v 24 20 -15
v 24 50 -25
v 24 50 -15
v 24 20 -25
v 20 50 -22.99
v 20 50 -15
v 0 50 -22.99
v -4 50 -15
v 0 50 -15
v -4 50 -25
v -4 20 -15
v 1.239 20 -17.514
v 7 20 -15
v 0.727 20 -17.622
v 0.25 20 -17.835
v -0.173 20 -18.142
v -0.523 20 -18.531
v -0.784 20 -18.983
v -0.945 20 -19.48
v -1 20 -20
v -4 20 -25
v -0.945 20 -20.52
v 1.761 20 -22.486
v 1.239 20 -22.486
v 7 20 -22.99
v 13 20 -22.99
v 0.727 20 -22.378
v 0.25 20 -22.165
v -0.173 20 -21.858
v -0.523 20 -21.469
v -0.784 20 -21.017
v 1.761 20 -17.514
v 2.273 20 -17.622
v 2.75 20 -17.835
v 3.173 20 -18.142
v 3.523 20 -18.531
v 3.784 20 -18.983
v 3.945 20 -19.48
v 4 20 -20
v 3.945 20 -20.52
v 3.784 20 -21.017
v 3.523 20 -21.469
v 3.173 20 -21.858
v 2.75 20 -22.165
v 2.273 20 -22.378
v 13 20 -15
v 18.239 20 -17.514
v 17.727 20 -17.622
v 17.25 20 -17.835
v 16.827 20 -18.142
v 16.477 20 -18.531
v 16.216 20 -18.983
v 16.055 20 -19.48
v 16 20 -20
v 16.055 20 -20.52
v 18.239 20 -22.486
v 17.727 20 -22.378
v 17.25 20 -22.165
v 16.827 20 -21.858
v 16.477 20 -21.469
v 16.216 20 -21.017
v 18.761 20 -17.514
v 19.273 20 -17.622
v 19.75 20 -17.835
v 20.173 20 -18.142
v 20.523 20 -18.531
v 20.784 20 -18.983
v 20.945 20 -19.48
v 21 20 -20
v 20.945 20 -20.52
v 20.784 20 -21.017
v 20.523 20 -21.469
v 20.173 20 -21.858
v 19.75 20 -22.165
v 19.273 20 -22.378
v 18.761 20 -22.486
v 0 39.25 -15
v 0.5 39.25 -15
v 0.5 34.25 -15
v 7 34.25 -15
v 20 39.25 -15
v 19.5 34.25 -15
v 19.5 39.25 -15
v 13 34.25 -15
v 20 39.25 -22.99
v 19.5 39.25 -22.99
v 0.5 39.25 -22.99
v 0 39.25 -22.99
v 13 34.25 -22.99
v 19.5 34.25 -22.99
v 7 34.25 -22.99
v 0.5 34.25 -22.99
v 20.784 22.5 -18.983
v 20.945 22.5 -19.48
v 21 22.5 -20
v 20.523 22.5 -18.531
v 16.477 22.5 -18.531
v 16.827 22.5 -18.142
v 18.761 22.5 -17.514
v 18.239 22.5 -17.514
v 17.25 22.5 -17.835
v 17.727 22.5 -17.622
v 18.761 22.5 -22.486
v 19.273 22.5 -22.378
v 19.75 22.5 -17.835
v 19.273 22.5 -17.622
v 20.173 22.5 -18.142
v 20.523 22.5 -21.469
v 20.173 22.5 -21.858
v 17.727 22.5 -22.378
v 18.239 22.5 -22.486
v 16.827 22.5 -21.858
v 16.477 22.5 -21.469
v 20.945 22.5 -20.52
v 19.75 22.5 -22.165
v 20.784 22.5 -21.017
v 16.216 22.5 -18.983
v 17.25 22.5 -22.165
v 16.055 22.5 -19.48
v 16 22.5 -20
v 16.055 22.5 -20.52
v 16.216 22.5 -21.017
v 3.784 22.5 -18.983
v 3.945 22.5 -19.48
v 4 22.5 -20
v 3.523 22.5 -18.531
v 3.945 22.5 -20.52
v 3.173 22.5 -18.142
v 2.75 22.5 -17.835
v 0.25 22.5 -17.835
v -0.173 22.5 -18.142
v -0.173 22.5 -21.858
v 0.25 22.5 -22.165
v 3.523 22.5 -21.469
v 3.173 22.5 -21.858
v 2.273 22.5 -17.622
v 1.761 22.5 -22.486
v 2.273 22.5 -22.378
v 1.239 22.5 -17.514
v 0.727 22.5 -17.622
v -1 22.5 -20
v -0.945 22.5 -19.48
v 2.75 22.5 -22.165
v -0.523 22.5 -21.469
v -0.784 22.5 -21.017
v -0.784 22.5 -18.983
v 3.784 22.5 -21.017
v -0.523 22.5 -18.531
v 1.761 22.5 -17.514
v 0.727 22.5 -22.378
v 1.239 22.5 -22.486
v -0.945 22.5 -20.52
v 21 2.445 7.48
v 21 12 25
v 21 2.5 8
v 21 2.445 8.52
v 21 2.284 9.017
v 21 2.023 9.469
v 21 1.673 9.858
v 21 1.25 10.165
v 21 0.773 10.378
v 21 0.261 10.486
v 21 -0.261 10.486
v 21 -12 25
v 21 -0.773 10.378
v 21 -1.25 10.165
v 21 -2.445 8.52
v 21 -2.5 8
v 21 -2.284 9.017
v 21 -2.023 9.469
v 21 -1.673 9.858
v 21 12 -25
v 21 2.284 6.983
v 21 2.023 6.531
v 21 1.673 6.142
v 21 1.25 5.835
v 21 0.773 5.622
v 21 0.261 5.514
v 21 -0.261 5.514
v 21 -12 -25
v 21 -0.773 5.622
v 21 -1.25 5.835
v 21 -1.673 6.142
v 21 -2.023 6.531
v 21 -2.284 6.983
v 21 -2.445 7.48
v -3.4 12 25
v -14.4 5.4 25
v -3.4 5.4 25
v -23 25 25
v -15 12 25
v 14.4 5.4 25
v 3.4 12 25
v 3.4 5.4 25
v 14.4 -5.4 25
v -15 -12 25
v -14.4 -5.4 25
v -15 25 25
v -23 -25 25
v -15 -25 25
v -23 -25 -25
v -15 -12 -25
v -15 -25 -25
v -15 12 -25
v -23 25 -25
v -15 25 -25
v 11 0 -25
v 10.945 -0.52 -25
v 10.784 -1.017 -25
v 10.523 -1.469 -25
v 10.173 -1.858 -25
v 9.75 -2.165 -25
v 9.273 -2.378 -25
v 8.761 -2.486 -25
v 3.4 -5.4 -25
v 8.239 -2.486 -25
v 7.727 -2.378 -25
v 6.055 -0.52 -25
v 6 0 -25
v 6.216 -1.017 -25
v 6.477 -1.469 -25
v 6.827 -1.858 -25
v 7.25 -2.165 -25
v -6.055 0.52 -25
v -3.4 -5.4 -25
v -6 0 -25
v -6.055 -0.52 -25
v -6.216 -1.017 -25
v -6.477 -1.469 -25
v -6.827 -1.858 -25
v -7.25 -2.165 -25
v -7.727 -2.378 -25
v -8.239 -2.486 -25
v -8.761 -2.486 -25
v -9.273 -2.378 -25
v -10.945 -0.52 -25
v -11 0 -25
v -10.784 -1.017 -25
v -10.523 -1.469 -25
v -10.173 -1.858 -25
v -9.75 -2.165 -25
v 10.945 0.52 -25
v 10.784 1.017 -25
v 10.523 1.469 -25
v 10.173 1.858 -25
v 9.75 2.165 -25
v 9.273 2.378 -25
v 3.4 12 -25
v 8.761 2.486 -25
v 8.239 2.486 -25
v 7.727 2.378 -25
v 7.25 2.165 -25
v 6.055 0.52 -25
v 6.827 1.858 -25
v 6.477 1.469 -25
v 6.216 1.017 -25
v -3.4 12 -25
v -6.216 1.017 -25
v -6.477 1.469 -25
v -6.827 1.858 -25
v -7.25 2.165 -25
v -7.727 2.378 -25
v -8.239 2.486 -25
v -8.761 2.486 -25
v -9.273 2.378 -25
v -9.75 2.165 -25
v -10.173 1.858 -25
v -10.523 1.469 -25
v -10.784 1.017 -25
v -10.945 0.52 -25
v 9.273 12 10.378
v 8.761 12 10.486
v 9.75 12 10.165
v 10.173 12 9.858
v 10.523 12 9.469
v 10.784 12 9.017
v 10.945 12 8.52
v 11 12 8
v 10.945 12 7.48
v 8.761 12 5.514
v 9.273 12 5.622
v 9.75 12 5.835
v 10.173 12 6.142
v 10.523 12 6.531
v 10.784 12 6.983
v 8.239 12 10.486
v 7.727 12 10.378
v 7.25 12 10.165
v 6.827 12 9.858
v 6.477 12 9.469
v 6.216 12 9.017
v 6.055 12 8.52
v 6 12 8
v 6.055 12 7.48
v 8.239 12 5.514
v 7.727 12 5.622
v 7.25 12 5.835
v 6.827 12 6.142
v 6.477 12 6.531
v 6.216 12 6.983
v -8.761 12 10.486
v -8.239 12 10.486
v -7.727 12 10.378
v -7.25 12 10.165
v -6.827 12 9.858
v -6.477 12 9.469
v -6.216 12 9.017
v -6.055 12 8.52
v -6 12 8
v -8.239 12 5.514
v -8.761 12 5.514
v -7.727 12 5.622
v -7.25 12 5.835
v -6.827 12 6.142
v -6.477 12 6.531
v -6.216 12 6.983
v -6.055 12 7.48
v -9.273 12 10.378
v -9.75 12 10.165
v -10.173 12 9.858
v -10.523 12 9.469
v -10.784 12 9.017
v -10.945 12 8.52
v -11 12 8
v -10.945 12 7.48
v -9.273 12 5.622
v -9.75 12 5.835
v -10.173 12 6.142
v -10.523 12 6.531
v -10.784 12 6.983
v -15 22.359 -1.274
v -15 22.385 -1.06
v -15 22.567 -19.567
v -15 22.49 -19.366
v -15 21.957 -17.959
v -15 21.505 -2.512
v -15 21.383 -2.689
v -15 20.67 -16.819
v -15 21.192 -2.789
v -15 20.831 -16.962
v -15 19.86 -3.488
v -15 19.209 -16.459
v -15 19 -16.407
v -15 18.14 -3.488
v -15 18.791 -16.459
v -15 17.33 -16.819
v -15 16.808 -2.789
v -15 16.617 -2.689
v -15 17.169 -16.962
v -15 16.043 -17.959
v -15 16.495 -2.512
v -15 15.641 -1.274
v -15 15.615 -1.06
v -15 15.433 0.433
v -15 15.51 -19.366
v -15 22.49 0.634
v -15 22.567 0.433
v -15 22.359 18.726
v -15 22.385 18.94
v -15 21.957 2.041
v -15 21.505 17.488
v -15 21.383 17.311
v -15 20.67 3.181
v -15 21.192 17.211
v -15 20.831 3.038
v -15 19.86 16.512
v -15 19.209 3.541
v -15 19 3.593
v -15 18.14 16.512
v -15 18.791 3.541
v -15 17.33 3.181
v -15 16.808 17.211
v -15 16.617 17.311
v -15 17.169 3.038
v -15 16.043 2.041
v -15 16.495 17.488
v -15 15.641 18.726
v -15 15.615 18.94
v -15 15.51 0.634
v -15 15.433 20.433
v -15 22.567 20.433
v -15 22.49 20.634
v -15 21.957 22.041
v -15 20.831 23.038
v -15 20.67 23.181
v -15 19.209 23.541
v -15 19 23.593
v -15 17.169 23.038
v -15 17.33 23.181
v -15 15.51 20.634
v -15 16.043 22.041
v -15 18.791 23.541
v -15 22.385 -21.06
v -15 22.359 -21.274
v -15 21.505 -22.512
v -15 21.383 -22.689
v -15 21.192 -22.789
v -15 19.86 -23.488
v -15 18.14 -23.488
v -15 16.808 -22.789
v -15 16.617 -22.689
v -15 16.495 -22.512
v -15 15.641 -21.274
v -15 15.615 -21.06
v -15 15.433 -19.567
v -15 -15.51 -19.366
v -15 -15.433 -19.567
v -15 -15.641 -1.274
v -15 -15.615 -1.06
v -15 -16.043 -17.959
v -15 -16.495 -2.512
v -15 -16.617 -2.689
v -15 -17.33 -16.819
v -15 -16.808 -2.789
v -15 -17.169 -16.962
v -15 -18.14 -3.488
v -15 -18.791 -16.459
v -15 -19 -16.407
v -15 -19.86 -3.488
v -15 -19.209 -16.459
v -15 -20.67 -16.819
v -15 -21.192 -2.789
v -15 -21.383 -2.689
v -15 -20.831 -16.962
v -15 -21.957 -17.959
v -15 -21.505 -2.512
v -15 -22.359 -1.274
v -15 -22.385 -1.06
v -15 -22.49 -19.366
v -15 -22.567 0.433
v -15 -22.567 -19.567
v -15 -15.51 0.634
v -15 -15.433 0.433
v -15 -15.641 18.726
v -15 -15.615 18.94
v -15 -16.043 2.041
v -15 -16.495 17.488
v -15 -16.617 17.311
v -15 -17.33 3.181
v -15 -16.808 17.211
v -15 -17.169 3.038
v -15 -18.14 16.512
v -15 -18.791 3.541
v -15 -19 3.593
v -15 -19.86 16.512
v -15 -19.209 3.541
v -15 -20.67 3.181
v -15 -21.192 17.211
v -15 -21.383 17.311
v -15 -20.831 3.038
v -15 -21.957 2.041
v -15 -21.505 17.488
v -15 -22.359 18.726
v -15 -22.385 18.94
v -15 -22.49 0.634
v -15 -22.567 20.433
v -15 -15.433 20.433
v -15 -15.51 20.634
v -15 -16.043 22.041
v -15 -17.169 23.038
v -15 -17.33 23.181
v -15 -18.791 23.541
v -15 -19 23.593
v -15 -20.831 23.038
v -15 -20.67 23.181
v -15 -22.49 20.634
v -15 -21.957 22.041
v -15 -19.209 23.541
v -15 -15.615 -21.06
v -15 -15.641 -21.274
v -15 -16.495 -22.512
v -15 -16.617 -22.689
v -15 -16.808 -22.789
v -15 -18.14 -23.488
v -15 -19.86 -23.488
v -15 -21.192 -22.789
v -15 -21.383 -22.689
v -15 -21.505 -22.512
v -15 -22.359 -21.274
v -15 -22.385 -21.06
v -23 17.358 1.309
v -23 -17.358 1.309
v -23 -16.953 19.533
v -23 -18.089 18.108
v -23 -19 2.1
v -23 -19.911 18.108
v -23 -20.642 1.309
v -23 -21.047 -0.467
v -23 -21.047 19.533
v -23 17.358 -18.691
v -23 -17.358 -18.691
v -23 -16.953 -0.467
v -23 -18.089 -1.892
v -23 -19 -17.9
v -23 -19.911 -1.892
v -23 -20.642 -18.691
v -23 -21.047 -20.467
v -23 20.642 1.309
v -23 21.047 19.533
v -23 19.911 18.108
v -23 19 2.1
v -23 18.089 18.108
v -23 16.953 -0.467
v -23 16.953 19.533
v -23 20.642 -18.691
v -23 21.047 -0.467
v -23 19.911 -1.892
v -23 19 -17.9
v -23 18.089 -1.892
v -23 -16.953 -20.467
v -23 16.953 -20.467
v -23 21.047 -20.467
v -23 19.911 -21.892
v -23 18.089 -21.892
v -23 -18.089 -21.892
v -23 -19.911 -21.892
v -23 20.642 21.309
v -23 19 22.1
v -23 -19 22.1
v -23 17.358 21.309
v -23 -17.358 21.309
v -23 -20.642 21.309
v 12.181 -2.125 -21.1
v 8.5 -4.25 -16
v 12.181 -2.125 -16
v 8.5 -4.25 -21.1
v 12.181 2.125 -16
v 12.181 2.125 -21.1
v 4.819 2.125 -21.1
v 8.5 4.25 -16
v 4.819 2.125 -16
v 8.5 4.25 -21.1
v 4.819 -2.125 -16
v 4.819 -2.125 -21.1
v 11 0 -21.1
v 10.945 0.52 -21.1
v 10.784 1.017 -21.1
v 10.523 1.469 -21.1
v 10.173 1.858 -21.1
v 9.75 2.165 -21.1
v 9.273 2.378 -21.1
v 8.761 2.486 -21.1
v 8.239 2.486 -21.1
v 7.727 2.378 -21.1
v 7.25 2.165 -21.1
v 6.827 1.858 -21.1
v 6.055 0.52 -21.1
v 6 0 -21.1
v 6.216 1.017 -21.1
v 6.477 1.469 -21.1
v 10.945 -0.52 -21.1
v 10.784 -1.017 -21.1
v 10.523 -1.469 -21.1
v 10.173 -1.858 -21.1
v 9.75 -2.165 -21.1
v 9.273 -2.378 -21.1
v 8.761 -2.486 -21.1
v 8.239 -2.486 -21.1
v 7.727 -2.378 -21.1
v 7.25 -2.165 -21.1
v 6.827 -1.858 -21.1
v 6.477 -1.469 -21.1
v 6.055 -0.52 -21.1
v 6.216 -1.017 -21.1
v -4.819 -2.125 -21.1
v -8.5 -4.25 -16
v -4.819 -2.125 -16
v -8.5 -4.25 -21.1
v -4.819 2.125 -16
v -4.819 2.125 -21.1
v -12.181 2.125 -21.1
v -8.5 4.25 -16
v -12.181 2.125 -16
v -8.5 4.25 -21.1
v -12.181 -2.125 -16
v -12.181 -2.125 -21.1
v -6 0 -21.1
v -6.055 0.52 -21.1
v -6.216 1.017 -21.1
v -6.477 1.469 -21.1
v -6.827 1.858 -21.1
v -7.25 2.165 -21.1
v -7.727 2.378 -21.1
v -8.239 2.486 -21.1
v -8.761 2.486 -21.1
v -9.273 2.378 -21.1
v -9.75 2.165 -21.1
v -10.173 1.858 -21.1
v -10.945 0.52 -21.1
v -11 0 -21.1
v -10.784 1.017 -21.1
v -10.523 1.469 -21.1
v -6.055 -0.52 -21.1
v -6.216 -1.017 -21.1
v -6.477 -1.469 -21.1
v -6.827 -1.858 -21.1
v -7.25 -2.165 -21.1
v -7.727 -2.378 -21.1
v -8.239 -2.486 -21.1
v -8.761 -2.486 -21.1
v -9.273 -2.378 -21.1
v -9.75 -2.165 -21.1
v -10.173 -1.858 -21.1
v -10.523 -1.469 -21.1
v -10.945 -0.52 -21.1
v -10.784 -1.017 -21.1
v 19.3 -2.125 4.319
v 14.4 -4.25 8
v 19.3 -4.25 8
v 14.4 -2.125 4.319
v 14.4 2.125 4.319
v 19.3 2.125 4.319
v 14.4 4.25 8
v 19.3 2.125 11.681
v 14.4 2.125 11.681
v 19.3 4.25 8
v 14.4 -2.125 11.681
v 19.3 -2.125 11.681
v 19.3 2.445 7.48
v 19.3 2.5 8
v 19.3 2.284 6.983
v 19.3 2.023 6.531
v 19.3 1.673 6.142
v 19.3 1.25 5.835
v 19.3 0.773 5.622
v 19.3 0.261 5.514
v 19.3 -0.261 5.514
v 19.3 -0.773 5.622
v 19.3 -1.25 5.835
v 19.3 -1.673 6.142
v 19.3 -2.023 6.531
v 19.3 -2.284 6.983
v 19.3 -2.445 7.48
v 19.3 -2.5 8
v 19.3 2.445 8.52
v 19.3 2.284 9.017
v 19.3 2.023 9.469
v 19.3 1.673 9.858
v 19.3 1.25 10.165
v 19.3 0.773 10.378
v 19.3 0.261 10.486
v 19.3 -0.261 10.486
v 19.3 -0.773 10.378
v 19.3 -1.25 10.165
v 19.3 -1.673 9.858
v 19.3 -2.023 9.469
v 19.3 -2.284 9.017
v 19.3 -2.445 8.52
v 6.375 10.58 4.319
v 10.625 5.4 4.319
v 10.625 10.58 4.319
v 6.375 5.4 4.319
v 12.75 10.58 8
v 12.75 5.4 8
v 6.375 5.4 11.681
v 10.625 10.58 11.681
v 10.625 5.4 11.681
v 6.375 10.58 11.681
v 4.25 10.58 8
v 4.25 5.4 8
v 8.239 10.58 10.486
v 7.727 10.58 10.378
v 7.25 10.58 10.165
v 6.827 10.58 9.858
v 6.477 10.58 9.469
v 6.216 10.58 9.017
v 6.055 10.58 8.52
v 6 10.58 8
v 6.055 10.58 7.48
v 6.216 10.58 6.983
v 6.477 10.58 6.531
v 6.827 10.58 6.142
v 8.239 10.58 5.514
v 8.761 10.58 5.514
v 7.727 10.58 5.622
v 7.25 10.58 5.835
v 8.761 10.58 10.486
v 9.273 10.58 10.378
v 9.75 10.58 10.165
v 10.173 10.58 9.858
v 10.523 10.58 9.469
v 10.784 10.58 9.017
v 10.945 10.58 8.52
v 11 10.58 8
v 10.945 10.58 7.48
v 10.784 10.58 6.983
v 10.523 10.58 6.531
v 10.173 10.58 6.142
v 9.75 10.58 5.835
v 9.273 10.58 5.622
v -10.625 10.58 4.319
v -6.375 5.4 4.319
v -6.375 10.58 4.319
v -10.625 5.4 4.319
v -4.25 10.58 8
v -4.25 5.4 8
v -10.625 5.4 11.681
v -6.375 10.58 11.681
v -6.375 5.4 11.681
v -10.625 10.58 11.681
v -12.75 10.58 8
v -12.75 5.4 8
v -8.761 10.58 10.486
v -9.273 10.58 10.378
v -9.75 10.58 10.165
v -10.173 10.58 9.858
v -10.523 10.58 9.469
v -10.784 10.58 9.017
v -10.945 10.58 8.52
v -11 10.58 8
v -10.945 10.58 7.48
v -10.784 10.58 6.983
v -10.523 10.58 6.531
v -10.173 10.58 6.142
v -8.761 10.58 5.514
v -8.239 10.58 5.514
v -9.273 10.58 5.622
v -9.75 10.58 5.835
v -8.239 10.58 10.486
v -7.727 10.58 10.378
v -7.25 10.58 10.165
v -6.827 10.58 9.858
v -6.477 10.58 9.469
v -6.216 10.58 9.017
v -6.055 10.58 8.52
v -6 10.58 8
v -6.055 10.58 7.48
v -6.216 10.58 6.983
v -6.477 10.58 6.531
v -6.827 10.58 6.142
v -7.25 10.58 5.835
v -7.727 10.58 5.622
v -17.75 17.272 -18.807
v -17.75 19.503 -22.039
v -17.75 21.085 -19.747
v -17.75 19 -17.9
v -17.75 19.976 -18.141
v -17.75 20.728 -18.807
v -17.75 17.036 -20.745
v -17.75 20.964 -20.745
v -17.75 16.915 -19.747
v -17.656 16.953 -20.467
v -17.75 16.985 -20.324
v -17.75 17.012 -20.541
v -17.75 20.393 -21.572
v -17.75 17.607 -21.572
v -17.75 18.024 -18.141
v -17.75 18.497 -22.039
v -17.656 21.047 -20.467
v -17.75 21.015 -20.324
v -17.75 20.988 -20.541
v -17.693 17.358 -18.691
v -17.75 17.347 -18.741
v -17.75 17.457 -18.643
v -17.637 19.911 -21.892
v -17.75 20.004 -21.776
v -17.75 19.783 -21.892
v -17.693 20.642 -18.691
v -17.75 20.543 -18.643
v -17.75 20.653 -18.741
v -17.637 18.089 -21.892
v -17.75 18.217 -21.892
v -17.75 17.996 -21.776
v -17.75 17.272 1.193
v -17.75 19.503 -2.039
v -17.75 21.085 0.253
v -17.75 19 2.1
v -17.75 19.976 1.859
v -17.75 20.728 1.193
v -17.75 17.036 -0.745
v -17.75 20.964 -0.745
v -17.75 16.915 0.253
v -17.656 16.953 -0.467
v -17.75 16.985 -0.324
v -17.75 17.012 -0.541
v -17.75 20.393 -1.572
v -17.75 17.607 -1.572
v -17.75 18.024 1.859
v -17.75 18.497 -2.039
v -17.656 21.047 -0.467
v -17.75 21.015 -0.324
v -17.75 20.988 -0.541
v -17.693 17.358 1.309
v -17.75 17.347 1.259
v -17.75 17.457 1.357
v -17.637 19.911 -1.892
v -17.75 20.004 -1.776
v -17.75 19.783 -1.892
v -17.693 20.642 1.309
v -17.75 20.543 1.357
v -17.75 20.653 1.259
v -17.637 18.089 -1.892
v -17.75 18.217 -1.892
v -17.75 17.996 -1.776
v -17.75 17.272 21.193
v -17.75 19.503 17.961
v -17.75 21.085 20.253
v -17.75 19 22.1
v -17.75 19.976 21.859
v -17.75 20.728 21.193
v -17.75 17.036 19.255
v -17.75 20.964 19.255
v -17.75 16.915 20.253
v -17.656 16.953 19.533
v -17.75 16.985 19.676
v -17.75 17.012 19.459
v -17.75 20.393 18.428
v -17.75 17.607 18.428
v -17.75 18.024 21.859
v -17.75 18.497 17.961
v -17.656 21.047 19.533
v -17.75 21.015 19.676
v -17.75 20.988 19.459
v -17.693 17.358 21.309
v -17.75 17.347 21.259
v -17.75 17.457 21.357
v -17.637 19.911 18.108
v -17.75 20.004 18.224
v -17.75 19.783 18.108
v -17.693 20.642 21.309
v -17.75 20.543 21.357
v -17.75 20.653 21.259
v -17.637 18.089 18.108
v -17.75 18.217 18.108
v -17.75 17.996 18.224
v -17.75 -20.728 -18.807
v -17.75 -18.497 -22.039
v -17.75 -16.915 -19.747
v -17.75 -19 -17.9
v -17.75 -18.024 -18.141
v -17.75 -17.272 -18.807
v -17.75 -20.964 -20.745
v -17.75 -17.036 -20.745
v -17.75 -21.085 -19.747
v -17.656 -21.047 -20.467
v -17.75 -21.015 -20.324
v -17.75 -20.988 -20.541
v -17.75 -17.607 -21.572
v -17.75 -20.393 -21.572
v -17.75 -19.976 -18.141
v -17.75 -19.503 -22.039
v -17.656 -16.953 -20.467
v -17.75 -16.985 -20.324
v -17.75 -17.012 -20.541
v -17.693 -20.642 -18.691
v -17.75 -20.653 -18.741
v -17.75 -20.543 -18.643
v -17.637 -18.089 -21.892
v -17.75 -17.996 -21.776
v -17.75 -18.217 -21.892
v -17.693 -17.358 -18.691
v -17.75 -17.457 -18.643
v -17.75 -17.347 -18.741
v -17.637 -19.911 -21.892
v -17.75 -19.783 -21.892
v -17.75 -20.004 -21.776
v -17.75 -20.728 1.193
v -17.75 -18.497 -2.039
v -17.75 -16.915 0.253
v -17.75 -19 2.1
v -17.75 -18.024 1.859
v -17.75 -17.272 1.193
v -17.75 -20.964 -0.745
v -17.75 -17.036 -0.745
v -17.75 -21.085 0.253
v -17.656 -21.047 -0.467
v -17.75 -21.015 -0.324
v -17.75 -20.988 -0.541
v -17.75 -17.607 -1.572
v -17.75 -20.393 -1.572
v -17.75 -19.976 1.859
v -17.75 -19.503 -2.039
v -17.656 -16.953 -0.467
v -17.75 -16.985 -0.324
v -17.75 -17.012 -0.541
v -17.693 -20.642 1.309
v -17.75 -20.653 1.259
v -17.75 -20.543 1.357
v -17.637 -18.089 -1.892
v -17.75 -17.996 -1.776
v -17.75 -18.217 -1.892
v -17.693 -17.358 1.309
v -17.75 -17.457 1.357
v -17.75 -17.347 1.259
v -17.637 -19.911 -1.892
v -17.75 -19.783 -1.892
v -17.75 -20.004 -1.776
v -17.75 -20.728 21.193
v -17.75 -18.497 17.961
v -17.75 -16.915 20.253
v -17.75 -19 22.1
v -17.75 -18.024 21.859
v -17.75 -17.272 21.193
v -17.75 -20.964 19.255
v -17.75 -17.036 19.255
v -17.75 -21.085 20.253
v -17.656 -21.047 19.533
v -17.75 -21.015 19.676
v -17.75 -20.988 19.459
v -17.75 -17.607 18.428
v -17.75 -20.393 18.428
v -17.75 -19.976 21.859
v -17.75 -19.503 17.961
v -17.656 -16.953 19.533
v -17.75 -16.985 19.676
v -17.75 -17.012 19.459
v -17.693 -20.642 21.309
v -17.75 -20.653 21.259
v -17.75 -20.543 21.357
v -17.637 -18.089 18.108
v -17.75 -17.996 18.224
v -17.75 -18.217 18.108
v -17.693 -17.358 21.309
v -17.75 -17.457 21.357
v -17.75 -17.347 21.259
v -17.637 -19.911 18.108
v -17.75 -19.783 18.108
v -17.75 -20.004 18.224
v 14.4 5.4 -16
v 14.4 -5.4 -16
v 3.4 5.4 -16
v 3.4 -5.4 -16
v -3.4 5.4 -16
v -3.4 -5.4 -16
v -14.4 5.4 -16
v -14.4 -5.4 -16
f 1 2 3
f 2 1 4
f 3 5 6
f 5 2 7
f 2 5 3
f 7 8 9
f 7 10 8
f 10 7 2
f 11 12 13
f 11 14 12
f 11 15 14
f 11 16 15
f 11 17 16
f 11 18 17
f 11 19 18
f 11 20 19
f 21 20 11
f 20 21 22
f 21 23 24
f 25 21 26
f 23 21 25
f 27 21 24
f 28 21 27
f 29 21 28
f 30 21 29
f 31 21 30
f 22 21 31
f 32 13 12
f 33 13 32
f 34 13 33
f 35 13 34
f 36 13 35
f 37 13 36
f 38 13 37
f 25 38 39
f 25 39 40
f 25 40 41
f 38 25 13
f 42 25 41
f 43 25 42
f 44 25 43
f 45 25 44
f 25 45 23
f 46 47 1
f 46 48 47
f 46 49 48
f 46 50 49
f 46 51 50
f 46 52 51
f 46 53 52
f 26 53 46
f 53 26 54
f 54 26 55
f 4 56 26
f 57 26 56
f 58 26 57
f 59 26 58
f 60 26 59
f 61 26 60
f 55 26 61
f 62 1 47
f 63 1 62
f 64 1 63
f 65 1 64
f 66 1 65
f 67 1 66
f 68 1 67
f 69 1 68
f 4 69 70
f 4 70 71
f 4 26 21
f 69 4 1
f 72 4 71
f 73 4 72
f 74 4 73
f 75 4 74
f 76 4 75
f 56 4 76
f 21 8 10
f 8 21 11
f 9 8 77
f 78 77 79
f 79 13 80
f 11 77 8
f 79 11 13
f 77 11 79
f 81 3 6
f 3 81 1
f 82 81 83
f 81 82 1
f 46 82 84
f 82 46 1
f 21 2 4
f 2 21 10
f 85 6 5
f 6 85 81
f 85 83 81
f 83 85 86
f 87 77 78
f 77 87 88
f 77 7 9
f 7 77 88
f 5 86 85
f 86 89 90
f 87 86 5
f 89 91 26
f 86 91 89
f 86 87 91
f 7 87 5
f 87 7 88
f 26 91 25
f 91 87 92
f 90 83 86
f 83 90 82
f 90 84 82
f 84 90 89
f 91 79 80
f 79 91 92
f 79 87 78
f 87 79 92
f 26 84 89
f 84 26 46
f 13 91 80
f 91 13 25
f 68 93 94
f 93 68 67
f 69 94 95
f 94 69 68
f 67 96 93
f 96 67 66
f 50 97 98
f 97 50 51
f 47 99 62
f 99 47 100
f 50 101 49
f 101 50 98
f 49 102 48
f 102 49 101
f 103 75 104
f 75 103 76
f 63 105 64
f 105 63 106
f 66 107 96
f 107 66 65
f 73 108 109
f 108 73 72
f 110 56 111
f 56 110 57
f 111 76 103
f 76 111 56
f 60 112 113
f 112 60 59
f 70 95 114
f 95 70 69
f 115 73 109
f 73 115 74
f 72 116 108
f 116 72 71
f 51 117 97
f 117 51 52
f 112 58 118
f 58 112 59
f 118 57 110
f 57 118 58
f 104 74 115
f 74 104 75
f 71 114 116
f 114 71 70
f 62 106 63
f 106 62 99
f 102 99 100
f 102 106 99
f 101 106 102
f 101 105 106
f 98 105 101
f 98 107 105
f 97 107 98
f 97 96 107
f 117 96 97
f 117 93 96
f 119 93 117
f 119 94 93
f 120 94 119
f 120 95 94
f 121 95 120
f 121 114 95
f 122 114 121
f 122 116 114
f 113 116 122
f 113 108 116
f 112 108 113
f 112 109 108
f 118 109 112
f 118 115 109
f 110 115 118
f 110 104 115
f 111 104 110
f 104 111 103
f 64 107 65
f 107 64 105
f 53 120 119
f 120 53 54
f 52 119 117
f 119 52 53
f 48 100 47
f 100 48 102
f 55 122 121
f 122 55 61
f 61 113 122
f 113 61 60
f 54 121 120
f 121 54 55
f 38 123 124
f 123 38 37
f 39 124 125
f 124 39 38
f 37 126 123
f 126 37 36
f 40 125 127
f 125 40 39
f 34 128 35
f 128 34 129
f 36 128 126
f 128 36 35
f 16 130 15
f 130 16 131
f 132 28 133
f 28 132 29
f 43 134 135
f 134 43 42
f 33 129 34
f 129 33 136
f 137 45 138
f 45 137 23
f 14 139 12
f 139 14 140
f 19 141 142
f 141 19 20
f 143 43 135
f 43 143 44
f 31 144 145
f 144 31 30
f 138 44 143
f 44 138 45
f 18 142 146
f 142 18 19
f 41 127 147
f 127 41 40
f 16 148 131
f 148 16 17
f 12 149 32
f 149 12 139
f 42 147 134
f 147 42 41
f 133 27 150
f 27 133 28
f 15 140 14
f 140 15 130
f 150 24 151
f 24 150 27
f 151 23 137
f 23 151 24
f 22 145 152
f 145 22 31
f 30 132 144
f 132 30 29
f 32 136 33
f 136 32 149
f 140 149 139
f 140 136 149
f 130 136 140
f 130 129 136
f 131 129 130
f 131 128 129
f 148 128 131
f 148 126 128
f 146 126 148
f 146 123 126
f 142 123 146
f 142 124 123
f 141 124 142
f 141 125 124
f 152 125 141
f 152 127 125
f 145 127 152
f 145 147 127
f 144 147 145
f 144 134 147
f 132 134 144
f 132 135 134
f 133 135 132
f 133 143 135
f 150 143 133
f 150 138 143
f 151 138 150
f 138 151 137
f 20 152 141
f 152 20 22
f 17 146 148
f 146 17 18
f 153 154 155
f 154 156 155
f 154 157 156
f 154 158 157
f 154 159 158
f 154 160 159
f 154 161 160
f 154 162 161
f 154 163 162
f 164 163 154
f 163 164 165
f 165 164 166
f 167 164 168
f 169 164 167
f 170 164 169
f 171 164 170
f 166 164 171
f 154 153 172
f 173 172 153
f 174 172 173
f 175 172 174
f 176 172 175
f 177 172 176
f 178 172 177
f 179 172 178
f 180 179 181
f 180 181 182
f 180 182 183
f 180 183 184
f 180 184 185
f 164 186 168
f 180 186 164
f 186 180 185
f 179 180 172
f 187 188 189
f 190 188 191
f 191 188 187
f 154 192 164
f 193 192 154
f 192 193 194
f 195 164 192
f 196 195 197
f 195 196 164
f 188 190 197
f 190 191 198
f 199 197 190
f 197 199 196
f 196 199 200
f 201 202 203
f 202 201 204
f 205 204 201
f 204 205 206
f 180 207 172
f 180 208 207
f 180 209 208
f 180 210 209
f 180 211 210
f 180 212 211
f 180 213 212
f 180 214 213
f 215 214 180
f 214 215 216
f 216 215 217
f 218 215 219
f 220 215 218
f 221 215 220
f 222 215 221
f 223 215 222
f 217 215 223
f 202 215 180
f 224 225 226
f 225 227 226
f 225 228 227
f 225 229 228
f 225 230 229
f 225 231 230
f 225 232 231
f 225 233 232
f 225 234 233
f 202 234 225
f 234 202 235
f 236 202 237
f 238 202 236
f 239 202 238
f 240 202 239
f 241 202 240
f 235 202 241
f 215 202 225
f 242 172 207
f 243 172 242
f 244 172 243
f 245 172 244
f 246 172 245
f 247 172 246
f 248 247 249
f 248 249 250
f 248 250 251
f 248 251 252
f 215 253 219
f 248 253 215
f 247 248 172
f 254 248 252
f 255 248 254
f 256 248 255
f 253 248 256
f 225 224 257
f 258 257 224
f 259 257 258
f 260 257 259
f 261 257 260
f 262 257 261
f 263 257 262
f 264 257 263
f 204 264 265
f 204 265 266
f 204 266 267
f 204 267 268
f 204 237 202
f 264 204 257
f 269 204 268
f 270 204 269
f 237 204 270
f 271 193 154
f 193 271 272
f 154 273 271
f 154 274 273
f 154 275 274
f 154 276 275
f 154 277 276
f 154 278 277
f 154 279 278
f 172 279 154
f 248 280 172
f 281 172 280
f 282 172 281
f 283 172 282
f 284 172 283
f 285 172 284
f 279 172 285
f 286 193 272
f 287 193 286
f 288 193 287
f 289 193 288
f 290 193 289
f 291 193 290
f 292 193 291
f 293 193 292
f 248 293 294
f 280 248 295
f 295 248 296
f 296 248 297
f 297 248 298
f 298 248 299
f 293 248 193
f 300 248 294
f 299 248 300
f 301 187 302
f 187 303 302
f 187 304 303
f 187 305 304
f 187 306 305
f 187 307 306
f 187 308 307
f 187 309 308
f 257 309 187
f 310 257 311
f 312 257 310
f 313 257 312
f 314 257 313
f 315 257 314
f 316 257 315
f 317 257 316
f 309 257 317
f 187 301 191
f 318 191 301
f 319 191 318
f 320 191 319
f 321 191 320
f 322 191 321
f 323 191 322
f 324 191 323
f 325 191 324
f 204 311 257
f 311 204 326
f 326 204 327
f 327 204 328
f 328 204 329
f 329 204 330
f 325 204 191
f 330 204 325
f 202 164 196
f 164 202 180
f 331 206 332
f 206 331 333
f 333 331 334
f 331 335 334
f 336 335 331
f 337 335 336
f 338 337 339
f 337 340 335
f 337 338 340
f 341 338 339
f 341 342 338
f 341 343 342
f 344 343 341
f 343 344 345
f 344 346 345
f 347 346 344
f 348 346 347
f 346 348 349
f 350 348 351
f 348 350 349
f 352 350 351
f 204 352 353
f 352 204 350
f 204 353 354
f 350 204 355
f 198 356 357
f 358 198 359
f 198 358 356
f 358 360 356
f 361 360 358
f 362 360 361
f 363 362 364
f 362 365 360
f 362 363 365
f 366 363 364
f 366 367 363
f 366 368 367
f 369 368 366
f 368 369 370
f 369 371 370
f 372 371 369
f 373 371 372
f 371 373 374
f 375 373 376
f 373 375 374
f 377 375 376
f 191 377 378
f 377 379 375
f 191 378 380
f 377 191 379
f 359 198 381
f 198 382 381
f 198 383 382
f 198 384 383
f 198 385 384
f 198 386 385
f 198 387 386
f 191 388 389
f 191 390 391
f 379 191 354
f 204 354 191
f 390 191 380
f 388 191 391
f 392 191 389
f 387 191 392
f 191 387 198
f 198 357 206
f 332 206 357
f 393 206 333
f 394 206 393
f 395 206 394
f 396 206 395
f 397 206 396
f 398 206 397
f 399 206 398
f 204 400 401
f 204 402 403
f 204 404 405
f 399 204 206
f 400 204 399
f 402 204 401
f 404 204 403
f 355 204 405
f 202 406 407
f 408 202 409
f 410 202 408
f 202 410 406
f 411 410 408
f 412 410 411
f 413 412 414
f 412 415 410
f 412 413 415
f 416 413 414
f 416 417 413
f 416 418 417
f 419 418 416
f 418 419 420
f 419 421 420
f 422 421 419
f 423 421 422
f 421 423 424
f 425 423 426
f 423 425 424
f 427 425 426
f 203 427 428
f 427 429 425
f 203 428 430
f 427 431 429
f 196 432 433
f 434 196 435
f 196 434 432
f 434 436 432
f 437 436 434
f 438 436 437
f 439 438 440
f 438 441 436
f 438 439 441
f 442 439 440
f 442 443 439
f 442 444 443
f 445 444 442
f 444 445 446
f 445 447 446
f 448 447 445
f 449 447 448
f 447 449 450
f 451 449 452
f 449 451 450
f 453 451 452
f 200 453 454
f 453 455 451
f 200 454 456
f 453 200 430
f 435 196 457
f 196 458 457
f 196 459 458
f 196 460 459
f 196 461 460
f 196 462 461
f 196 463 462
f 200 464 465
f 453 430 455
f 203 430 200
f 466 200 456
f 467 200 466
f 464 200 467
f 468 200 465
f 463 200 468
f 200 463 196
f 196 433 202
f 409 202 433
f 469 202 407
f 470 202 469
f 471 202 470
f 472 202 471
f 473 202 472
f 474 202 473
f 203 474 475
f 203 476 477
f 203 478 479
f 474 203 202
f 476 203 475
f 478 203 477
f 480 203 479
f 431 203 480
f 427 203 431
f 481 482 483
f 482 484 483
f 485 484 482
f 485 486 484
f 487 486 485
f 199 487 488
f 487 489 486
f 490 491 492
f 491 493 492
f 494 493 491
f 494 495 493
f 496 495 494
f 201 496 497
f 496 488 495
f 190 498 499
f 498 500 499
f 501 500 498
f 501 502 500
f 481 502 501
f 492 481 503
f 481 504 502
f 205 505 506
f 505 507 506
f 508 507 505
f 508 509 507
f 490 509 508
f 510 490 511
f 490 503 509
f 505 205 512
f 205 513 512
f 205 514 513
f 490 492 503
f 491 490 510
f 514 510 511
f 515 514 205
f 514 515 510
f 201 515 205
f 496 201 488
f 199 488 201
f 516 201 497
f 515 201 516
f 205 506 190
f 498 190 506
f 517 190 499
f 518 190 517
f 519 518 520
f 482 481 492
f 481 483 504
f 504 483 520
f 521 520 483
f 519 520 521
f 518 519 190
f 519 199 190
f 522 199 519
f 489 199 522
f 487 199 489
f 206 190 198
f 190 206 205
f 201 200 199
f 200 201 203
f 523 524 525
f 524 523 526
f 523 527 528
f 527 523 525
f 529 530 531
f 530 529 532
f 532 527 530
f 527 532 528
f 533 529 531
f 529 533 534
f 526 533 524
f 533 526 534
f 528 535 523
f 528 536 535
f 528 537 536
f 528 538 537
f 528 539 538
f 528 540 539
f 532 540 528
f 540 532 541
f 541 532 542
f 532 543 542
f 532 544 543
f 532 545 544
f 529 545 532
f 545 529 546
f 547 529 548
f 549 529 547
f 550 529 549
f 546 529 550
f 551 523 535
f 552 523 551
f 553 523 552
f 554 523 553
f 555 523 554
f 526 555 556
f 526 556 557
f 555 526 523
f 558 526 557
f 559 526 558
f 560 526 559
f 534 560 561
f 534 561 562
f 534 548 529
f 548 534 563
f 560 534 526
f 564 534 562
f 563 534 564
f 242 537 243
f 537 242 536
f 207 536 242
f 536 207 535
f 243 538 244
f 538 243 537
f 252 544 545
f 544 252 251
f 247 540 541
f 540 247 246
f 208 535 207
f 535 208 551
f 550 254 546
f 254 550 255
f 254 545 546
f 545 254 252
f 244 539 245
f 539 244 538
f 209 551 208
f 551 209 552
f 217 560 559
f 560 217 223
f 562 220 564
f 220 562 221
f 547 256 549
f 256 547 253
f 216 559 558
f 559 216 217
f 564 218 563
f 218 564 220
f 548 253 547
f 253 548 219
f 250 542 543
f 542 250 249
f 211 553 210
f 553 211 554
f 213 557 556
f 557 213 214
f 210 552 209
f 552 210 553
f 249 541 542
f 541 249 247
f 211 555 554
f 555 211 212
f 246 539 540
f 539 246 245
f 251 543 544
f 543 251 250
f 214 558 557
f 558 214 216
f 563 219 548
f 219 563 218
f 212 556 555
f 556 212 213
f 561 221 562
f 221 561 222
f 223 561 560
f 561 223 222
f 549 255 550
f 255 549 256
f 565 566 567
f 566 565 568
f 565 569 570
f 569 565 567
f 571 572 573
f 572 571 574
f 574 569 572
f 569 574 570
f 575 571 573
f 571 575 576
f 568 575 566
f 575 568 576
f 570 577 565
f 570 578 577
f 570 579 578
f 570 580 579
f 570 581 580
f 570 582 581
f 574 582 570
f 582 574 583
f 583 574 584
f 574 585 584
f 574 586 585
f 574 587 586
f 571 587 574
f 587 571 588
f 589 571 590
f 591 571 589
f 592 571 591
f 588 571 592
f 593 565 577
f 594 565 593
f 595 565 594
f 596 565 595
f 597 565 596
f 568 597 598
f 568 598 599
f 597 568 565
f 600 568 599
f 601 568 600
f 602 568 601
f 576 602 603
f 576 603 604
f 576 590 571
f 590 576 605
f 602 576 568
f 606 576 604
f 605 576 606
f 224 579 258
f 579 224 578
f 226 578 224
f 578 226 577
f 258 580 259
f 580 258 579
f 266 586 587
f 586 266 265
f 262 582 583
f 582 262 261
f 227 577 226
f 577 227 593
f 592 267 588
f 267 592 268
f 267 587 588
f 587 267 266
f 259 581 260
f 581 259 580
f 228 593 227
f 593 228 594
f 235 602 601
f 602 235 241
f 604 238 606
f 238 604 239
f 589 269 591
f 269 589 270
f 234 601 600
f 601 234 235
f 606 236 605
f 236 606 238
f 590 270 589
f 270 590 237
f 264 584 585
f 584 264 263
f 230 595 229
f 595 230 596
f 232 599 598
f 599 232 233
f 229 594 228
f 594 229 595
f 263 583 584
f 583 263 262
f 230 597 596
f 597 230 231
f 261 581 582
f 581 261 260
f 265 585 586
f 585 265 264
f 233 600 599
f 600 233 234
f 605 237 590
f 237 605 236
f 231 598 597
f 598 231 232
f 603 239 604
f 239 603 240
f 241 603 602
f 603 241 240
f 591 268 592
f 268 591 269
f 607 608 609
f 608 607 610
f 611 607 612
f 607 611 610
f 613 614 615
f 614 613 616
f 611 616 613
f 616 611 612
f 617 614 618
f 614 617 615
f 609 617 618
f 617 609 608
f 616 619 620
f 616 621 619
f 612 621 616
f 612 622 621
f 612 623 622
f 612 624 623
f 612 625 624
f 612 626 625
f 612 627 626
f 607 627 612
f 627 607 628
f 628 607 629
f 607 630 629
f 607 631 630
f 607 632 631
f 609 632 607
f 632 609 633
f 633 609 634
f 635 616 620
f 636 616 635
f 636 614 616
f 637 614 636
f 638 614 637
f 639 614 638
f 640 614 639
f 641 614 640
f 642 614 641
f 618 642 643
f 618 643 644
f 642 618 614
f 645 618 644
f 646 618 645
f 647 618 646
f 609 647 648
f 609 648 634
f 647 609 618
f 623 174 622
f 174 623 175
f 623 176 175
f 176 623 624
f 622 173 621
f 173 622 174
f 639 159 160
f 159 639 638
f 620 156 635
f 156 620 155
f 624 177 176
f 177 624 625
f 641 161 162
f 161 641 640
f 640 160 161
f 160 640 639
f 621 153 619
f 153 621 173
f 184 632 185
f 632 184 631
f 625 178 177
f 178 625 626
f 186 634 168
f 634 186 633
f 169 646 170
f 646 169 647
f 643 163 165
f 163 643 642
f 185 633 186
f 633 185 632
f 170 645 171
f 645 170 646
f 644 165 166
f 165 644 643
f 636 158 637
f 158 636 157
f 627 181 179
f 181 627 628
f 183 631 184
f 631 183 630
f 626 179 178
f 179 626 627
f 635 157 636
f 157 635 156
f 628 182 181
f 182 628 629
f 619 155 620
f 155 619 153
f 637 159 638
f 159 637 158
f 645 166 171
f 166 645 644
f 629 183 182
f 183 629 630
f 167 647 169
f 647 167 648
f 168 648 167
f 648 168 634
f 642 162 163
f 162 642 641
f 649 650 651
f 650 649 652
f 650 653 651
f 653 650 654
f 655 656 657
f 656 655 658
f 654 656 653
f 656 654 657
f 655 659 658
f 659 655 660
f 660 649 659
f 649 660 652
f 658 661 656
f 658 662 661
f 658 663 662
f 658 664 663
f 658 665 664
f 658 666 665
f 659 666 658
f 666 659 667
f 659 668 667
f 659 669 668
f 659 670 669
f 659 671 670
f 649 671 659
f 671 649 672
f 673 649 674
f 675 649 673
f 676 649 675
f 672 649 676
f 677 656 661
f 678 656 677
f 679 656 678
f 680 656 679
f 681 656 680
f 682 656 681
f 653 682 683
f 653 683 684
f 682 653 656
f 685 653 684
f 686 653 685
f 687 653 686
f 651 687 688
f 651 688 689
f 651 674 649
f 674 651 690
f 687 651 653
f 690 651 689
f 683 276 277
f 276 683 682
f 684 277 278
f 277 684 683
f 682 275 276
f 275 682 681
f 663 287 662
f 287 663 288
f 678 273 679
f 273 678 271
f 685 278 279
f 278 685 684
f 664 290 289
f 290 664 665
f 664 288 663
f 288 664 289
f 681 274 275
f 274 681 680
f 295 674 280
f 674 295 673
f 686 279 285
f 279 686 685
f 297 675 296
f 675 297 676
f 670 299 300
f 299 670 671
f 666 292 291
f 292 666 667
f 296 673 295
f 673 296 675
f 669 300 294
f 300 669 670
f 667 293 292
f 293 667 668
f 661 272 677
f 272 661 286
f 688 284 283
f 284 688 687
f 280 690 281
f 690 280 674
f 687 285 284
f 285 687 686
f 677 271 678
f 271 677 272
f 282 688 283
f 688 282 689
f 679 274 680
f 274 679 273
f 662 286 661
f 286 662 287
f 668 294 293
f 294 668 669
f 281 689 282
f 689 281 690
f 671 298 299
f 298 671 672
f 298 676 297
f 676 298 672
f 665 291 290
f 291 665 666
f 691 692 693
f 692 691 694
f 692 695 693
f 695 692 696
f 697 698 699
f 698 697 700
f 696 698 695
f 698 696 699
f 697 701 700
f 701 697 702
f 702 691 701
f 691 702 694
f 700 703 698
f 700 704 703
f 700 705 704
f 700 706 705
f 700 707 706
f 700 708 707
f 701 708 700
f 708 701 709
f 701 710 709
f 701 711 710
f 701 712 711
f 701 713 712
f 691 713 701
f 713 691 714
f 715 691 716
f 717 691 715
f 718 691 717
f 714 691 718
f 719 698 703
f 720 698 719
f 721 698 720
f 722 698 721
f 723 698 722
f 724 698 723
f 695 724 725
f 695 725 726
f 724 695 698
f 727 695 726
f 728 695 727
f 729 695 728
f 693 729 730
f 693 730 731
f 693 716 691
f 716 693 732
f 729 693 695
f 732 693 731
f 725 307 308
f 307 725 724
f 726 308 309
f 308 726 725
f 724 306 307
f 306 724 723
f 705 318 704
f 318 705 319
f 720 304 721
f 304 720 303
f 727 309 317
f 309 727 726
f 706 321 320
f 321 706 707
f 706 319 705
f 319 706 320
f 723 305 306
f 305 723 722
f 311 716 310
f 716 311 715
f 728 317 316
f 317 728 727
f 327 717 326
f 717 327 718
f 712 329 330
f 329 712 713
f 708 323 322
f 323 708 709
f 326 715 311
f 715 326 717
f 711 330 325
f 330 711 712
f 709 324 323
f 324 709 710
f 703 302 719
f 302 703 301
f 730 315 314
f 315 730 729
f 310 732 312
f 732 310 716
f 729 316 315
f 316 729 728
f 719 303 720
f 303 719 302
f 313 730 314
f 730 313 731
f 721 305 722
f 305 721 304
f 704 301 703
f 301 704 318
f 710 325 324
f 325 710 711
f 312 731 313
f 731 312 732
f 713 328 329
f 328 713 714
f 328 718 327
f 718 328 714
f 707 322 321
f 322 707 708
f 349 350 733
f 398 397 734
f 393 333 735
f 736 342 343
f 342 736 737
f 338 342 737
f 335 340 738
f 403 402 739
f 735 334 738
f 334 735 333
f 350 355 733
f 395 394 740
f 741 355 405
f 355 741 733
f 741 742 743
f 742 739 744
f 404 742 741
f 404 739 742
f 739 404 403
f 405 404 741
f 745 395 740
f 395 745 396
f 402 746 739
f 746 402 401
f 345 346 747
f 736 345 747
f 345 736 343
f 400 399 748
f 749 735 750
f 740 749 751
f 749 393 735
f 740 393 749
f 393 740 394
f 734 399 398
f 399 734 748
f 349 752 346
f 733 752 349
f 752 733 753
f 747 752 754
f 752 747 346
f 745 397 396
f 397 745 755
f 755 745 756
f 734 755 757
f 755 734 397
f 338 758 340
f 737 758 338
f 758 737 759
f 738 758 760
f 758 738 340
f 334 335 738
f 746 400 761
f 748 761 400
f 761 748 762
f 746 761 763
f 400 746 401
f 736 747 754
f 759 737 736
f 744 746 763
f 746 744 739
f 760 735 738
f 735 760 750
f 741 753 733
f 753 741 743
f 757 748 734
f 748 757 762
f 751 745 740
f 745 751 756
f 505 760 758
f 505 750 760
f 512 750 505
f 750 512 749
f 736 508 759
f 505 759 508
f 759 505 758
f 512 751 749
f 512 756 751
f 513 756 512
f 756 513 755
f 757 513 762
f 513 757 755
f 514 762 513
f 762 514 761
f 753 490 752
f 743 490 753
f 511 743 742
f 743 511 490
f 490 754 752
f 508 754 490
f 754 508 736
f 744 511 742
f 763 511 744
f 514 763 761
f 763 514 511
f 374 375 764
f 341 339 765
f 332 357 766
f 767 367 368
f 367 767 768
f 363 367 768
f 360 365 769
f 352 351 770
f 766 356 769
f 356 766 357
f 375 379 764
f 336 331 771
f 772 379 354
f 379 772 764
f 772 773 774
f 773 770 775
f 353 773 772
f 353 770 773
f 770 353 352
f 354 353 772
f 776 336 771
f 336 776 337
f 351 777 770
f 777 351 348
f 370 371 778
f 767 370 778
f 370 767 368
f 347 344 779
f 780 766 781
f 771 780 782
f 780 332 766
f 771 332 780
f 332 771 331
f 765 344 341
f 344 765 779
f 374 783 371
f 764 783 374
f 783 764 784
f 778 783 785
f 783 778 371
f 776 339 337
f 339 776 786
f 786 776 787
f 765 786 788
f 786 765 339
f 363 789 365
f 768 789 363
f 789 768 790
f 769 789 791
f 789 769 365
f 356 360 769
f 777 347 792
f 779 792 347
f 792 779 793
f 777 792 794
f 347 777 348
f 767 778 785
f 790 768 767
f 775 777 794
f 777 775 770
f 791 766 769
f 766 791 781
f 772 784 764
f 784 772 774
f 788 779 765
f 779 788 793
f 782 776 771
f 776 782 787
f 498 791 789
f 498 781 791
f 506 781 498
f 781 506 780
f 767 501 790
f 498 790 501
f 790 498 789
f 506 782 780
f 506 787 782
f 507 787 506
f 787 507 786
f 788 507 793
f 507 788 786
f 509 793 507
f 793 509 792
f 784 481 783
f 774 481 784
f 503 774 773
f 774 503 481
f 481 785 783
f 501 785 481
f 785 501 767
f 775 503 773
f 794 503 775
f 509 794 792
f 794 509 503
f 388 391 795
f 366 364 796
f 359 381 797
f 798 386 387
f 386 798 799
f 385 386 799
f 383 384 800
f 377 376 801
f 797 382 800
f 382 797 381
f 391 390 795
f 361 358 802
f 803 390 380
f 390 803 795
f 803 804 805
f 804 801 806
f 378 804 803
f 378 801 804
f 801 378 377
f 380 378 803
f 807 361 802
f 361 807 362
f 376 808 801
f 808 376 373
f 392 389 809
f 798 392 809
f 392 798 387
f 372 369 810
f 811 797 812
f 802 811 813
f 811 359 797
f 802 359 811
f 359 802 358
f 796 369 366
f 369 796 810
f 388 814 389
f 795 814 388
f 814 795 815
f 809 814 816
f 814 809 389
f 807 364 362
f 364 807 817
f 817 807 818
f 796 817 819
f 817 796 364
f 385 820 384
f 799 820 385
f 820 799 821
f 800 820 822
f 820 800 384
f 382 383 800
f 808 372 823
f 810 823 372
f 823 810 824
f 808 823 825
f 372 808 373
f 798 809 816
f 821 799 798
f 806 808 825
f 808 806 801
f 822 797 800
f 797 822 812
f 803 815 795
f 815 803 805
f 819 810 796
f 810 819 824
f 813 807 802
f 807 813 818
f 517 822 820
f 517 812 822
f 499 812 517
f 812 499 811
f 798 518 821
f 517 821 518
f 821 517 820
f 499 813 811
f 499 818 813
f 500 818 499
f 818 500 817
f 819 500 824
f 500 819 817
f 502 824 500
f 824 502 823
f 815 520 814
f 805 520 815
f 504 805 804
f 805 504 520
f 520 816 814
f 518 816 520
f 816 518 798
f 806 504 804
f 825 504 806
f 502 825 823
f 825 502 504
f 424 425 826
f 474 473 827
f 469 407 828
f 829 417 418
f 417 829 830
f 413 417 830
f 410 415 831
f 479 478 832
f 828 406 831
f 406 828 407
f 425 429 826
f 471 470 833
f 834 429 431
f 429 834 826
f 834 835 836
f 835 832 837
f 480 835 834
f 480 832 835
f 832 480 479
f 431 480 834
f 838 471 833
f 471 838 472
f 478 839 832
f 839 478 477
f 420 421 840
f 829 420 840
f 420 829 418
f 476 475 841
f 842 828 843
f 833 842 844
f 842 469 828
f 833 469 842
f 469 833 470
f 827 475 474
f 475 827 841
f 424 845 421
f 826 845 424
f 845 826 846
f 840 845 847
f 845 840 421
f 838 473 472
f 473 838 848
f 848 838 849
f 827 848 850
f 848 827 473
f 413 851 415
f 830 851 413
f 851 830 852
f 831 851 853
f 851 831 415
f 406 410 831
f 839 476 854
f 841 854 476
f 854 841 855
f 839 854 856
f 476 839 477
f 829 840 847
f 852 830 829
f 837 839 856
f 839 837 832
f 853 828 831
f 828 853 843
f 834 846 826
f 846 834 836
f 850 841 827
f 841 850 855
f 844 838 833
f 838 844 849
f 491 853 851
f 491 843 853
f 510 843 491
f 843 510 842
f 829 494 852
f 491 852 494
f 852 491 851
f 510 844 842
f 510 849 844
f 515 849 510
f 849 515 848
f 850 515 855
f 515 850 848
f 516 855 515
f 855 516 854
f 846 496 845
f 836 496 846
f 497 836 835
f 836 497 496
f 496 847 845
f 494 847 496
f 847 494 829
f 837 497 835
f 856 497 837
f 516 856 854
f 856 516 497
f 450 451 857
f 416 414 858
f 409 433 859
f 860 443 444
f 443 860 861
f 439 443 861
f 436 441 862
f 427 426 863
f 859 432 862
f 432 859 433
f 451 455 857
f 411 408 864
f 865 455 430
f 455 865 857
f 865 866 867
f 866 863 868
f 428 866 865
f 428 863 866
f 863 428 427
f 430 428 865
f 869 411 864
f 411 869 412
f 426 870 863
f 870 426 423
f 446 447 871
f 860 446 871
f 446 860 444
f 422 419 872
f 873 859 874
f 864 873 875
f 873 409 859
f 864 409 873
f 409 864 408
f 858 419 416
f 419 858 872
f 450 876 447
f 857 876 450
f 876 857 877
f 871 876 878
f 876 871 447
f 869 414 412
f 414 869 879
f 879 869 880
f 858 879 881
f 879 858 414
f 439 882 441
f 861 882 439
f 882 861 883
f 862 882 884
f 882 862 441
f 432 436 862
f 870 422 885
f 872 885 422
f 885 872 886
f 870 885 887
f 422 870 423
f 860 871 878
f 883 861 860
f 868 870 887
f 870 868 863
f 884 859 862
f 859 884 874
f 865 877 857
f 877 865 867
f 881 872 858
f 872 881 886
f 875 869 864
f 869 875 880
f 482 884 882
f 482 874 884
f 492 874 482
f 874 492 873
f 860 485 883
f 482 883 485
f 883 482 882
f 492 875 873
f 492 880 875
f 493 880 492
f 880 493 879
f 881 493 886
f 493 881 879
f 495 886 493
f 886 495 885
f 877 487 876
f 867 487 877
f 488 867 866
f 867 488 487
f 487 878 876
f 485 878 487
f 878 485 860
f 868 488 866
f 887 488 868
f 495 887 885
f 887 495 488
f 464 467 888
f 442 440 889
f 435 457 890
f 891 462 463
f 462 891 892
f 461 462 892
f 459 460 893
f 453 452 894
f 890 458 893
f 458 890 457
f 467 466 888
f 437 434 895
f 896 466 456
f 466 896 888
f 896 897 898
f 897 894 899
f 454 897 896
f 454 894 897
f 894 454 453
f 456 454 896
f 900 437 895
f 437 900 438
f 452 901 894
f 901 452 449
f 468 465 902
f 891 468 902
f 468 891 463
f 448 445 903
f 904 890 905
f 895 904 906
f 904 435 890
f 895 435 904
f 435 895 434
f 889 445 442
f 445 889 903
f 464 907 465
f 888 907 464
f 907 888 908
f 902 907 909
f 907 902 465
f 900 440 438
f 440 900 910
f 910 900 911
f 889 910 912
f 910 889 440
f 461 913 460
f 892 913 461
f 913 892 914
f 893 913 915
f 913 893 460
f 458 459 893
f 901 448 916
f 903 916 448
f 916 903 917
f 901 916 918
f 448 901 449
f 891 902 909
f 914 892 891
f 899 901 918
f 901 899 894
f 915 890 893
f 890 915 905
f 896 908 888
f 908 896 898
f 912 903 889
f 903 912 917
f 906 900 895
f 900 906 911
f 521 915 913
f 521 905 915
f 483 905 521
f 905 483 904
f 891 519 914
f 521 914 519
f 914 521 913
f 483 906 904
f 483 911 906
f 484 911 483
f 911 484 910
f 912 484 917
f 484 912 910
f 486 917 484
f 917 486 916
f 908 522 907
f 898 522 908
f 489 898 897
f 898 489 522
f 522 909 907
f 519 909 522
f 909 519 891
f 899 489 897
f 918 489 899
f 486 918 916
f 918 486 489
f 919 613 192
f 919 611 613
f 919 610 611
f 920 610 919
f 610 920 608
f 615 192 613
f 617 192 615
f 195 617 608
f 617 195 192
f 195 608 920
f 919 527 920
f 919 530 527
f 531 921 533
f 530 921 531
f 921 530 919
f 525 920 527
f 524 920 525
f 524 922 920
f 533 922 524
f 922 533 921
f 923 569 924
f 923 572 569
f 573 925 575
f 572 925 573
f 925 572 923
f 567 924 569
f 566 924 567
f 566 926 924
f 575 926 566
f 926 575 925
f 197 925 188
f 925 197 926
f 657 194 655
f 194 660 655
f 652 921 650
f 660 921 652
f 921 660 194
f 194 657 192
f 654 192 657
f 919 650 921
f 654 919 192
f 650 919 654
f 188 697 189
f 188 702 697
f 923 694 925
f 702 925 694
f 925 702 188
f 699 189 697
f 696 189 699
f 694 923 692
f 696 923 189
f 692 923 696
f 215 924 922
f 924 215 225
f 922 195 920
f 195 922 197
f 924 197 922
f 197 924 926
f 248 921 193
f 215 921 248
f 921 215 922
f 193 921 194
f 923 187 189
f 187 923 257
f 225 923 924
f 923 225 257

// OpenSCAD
translate([10,35,-20])rotate([-90,0,0])mirror([0,1,0])difference(){
cube([28,10,30],true);
translate([0,1.51,9.65])cube([20,9,10.8],true);
translate([0,1.51,4.65])cube([19,9,10.8],true);
translate([0,1.51,.65])cube([6,9,40.8],true);
translate([8.5,0,-14])cylinder(r=2.5,h=3,center=true,$fn=30);
translate([-8.5,0,-14])cylinder(r=2.5,h=3,center=true,$fn=30);
}

module m4nynut(){
cylinder(r=8.5/2,h=5.2,$fn=6,center=true);
}
module 4mbevel(){
cylinder(r1=8/2,r2=4.2/2,h=3.5,center=true);
cylinder(r=4.2/2,h=20);
}

difference(){
union(){
cube([42,24,50],true);
translate([-19,0,0])cube([8,50,50],true);
}
translate([0,0,9])cube([28.8,10.8,50],true);
translate([0,5,-1])cube([6.8,20.8,53],true);
translate([8.5,0,-18.5]){rotate([0,0,30])m4nynut();cylinder(r=2.5,h=15,center=true,$fn=30);}
translate([-8.5,0,-18.5]){rotate([0,0,30])m4nynut();cylinder(r=2.5,h=15,center=true,$fn=30);}
translate([16.7,0,8])rotate([0,90,0])rotate([0,0,30]){m4nynut();cylinder(r=2.5,h=15,center=true,$fn=30);}
translate([8.5,7.98,8])rotate([90,0,0]){m4nynut();cylinder(r=2.5,h=15,center=true,$fn=30);}
translate([-8.5,7.98,8])rotate([90,0,0]){m4nynut();cylinder(r=2.5,h=15,center=true,$fn=30);}
translate([-16,19,-20])rotate([0,-90,0])4mbevel();
translate([-16,19,0])rotate([0,-90,0])4mbevel();
translate([-16,19,20])rotate([0,-90,0])4mbevel();
translate([-16,-19,-20])rotate([0,-90,0])4mbevel();
translate([-16,-19,0])rotate([0,-90,0])4mbevel();
translate([-16,-19,20])rotate([0,-90,0])4mbevel();

}
